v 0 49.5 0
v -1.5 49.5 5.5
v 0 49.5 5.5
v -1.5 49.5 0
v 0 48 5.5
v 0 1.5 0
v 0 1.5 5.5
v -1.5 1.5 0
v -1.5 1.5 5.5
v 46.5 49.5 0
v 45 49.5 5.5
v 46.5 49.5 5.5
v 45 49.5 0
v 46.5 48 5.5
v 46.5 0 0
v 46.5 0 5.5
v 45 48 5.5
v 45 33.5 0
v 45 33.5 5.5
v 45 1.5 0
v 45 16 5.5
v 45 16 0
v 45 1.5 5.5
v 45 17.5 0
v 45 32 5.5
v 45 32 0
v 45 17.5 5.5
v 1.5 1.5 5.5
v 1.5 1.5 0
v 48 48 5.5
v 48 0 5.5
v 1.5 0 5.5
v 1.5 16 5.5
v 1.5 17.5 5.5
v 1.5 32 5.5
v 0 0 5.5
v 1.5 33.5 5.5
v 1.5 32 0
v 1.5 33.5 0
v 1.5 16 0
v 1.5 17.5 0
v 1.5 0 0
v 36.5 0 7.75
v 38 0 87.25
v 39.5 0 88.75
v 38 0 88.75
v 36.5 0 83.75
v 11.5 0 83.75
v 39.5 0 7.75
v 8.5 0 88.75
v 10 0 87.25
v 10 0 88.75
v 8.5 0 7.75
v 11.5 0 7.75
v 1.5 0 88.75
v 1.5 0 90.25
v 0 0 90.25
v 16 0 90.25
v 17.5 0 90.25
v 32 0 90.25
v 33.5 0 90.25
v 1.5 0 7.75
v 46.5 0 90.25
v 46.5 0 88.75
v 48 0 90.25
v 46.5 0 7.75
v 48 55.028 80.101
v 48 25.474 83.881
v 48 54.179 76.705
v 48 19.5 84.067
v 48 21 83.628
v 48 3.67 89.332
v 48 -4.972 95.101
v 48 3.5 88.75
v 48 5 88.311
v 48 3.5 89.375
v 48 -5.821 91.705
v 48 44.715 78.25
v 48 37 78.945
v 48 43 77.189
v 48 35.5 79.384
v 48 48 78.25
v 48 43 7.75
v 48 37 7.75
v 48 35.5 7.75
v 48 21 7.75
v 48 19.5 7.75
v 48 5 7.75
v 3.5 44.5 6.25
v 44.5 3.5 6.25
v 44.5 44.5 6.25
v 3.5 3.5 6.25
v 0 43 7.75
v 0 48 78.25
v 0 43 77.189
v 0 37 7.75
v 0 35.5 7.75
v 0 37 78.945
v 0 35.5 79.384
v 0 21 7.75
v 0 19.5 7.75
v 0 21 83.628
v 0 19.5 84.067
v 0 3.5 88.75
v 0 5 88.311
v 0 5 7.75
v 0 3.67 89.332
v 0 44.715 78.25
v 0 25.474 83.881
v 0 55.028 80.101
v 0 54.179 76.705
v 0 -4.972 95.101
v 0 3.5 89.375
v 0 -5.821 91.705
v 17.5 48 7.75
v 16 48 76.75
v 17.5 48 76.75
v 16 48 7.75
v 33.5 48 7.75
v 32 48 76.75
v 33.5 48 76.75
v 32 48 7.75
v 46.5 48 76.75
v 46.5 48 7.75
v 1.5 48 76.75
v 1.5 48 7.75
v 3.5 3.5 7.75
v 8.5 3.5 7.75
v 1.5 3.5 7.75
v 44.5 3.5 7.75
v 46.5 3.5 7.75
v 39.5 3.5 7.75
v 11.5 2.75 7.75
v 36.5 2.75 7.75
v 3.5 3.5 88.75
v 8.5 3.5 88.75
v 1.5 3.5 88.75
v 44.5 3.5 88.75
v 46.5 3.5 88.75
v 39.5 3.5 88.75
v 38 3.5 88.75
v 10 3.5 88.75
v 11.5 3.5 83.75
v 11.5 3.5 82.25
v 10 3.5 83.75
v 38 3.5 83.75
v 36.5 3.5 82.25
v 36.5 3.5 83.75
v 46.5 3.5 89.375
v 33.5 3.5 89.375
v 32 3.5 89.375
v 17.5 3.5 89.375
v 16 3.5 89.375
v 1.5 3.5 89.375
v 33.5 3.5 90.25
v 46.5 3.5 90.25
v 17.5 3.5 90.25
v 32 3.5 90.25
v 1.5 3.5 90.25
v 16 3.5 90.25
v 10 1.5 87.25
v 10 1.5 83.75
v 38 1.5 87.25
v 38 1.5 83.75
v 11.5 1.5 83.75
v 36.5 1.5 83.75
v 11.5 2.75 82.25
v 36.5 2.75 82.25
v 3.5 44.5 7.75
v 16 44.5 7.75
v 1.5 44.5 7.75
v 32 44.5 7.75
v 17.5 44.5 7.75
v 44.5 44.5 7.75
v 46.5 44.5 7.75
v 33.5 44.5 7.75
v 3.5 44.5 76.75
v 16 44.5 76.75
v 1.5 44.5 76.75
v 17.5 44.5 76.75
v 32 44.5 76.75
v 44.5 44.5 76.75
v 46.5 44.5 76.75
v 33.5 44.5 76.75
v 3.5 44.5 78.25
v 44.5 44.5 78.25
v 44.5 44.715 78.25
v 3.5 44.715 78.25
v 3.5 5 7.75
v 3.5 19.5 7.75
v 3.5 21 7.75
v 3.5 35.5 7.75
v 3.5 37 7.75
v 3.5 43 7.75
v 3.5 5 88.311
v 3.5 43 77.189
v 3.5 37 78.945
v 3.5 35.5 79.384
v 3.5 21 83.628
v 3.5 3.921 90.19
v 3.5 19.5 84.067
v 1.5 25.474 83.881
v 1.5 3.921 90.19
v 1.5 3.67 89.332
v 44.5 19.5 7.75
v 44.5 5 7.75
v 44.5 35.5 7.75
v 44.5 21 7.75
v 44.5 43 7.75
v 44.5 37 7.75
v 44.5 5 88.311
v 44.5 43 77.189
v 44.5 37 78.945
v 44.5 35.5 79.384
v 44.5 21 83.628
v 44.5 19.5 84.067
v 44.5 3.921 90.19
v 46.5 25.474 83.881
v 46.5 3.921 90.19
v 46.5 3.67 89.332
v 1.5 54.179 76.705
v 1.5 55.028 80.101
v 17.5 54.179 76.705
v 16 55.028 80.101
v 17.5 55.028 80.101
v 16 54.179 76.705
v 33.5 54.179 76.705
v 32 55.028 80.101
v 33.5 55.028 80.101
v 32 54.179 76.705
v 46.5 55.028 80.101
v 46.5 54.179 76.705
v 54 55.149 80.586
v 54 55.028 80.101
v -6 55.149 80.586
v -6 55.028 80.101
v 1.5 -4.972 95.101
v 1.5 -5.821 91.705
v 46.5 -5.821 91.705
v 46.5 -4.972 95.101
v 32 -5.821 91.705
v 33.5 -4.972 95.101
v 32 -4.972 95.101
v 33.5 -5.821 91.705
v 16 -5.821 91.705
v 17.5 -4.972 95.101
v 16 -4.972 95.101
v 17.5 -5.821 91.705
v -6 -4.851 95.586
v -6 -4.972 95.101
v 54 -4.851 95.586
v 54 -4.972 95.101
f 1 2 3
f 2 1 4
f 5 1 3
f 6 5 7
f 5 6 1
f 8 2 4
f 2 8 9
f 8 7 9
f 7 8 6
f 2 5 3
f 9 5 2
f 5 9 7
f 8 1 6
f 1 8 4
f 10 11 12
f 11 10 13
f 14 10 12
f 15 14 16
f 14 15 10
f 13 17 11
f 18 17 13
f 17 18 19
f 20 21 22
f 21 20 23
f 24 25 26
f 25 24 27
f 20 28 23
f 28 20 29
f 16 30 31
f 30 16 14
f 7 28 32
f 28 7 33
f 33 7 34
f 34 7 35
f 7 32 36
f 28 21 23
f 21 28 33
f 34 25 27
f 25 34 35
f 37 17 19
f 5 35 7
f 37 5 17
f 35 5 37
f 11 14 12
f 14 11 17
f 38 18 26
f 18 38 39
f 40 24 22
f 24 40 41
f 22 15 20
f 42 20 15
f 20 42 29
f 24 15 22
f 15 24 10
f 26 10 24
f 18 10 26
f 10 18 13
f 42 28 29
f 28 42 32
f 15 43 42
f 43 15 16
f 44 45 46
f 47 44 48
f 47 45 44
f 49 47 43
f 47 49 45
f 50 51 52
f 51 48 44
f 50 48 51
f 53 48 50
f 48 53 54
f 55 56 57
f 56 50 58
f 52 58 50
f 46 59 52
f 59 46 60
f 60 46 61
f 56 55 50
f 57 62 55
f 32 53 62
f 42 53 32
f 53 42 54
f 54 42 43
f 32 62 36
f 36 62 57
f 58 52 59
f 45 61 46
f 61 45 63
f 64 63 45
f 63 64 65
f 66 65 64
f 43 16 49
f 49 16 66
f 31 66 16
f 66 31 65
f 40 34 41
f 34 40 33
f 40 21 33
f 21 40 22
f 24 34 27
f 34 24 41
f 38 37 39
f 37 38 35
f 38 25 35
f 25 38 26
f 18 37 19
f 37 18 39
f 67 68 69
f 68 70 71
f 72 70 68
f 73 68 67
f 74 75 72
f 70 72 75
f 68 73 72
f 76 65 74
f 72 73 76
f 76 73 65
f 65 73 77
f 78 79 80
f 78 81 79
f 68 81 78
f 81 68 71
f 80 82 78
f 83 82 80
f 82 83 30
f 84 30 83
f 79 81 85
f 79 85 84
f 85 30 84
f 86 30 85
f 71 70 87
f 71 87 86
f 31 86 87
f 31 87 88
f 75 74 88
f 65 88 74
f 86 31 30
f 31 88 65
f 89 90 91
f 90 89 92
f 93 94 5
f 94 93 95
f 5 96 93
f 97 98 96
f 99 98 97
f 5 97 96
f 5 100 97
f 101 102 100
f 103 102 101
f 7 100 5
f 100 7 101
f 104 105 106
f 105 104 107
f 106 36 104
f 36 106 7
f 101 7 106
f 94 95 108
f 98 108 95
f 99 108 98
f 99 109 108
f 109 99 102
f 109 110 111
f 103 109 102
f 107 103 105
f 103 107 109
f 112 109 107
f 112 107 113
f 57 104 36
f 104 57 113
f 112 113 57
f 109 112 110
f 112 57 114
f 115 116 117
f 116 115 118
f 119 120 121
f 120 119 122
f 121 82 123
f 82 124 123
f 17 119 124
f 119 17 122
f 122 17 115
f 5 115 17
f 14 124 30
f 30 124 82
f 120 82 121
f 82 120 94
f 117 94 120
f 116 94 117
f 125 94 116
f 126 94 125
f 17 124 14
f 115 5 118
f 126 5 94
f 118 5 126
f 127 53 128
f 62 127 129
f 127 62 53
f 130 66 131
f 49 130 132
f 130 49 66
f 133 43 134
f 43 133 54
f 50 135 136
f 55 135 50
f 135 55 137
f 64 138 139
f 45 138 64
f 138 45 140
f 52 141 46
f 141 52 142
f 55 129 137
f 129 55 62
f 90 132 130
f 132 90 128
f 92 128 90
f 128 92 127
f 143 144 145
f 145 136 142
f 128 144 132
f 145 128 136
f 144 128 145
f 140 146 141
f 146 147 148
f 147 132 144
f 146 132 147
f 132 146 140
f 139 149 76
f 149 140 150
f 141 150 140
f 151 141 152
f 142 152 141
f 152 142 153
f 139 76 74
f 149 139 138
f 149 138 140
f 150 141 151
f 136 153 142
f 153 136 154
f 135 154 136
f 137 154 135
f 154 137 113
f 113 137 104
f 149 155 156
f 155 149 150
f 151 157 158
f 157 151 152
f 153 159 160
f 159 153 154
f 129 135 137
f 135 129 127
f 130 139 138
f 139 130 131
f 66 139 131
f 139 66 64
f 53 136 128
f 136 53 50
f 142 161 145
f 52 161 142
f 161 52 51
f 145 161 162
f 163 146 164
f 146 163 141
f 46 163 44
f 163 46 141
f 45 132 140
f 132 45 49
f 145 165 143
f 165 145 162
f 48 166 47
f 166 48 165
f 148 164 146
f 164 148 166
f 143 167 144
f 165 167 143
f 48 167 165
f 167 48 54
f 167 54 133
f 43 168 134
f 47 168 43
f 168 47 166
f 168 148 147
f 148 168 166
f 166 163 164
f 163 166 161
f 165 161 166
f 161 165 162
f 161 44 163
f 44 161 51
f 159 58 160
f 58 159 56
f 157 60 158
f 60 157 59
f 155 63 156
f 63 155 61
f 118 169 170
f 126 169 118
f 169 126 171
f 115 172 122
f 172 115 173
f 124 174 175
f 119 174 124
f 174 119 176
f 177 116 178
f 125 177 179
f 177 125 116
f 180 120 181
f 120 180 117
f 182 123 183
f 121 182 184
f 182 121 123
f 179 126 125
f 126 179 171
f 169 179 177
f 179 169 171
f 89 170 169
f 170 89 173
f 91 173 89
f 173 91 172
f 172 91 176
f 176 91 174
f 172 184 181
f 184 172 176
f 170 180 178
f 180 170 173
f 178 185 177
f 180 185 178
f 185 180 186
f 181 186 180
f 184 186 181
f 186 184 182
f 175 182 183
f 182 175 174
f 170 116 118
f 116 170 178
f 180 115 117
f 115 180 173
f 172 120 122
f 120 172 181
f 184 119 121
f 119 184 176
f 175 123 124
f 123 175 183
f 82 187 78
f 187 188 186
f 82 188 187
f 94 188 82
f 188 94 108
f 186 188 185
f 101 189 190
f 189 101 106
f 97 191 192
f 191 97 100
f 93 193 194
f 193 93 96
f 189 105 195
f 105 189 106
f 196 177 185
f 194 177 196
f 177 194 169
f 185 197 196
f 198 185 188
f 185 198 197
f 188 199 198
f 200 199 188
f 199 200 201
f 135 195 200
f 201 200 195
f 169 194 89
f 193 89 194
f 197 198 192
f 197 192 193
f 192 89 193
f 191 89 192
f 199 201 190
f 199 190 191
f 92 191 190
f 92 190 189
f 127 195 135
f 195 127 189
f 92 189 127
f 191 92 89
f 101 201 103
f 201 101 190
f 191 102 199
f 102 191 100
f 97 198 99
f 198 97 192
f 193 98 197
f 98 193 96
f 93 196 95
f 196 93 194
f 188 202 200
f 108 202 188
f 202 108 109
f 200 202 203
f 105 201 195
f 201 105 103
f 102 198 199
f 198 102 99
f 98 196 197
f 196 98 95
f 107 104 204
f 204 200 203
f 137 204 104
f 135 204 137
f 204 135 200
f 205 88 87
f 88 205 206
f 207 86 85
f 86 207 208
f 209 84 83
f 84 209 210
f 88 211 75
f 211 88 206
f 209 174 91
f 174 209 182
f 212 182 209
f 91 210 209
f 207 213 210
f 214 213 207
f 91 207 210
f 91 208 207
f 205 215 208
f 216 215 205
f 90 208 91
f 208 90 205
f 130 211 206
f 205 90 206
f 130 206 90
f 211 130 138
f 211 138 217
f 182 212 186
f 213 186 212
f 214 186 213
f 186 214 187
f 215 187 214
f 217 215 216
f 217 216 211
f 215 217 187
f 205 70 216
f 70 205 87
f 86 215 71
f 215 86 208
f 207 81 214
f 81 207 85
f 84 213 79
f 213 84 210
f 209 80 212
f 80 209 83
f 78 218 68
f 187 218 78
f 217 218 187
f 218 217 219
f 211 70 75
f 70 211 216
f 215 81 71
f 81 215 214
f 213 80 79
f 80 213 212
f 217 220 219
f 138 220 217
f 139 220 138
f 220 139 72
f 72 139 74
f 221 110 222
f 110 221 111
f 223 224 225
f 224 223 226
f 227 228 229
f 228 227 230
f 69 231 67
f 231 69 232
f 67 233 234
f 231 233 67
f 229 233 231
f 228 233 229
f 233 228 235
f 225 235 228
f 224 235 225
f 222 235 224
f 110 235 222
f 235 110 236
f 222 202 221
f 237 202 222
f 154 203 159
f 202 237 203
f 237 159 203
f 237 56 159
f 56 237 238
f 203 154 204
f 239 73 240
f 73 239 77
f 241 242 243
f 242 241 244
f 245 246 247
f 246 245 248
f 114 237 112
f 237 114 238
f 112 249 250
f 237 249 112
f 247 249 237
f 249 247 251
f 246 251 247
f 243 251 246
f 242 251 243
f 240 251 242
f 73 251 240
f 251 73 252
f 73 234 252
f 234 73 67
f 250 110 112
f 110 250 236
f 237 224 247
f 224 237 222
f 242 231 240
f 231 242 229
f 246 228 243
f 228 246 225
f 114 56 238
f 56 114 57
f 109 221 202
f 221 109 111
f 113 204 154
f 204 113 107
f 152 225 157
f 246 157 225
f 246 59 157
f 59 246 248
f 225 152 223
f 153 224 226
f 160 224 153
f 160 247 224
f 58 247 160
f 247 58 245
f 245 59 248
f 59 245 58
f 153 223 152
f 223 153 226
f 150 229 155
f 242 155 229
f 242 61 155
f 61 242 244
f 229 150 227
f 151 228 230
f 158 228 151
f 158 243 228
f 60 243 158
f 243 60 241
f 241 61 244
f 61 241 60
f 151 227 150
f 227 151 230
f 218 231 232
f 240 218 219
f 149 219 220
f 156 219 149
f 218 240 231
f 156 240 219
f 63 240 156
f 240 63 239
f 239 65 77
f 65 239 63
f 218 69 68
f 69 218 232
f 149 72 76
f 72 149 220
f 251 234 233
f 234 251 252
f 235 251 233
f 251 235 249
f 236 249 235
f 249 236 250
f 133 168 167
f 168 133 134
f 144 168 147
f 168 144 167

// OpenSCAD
// outhouse.scad — parametric framed outhouse for a recreational property.
// Units: INCHES.  Built from real dimensional lumber via lib/lumber.scad, so the
// cut list (captured from echoes) always matches this geometry.
//
// Edit the parameters below and re-run `cad-build projects/outhouse --open` to
// regenerate the render + cut list + PDF.

use <../../lib/lumber.scad>

/* ───── parameters ───── */
WIDTH   = 48;   // X: side-to-side (outside of framing)
DEPTH   = 48;   // Y: front-to-back
H_FRONT = 84;   // wall height at front (door side) — measured from floor deck
H_BACK  = 72;   // wall height at back (roof slopes down toward the back)
STUD_OC = 16;   // stud spacing, on-center
OVERHANG = 6;   // roof overhang past the walls

DOOR_W  = 28;   // rough opening width
DOOR_H  = 76;   // rough opening height

// When true, hide the roof + door panel so the top view reads as a framing
// plan. cad-render sets this (via -D PLAN_VIEW=true) for the plan render only.
PLAN_VIEW = false;

JOIST   = "2x6";          // floor joists
FRAME   = "2x4";          // wall + roof framing
DECK_T  = 0.75;           // floor deck plywood
ROOF_T  = 0.5;            // roof sheathing plywood

WALL_DEPTH = lumber_dims(FRAME)[0];   // 3.5 — wall thickness
PLATE_T    = lumber_dims(FRAME)[1];   // 1.5 — plate thickness
JOIST_H    = lumber_dims(JOIST)[0];   // 5.5 — floor frame height
DECK_TOP   = JOIST_H + DECK_T;        // top of floor deck; walls start here

/* ───── plan metadata (flows into the PDF) ───── */
plan_meta(
    title    = "Outhouse — Recreational Property",
    subtitle = str(WIDTH, "\" x ", DEPTH, "\" footprint, mono-slope roof, ", DOOR_W, "\" door"),
    units    = "inches",
    material = "construction-grade SPF; pressure-treated floor frame; plywood deck/roof");
plan_dim("Footprint",        str(WIDTH, "\" x ", DEPTH, "\""));
plan_dim("Wall height",      str(H_FRONT, "\" front / ", H_BACK, "\" back"));
plan_dim("Roof slope",       str(round(atan((H_FRONT-H_BACK)/DEPTH)*10)/10, "° (", H_FRONT-H_BACK, "\" drop over ", DEPTH, "\")"));
plan_dim("Door rough op'ng", str(DOOR_W, "\" x ", DOOR_H, "\""));
plan_dim("Stud spacing",     str(STUD_OC, "\" o.c."));
plan_note("Build the floor frame from pressure-treated lumber; everything above can be SPF.");
plan_note("Set the floor frame level on blocks/skids; check it for square before decking.");
plan_note("Sheathe the roof, then add roofing felt + metal or asphalt; cut siding to taste.");
plan_note("Hang the door to swing OUT so it clears the (downhill) interior.");

// Ordered build sequence (rendered as a numbered Assembly Sequence in the PDF).
plan_step("Set level skids/blocks, then build the PT floor frame (rims + joists) and check it for square.");
plan_step("Deck the floor with 3/4\" plywood, fastened to every joist.");
plan_step("Frame the walls on the deck: front tall, back short, side walls cut on the slope; frame the door opening with king + jack studs and a header.");
plan_step("Stand the four walls, plumb and brace them, then nail the corners together.");
plan_step("Set the sloped rafters at 16\" o.c.; sheathe the roof, then felt + metal/asphalt.");
plan_step("Hang the door, add siding/finishes, prime and paint.");

/* ───── floor frame: 2x6 joists on edge + plywood deck ───── */
module floor() {
    // side rims run along Y
    for (x = [0, WIDTH - PLATE_T])
        translate([x, 0, 0]) rotate([0, 0, 90]) translate([0, 0, 0])
            // beam runs along +X; rotate 90° about Z -> runs along +Y
            translate([PLATE_T, 0, 0]) beam(JOIST, DEPTH, "floor side rim");
    // cross joists run along X, between the side rims, at OC
    for (y = [0 : STUD_OC : DEPTH - 1])
        translate([PLATE_T, min(y, DEPTH - PLATE_T), 0])
            beam(JOIST, WIDTH - 2*PLATE_T, "floor joist");
    // deck (hidden in plan view so the joist layout shows through)
    if (!PLAN_VIEW)
        translate([0, 0, JOIST_H]) sheet(DECK_T, WIDTH, DEPTH, "floor deck");
}

/* ───── a stud wall built along +X, sitting on the floor deck ─────
   L  = length, hf/hb = wall height at x=0 / x=L (equal => flat top).
   opening = [x0, w, h] for a door/window rough opening (or undef). */
module stud_wall(L, hf, hb, opening = undef, tag = "wall") {
    sloped = (hf != hb);
    ang = atan((hf - hb) / L);

    // bottom plate
    plate(FRAME, L, str(tag, " bottom plate"));

    // top plate (horizontal, or sloped along the wall)
    if (!sloped)
        translate([0, 0, hf - PLATE_T]) plate(FRAME, L, str(tag, " top plate"));
    else
        translate([0, 0, hf - PLATE_T]) rotate([0, ang, 0])
            plate(FRAME, L / cos(ang), str(tag, " top plate (sloped)"));

    function h_at(x) = hf + (hb - hf) * x / L;

    has_op = !is_undef(opening);
    ox = has_op ? opening[0] : -1;
    ow = has_op ? opening[1] : 0;
    oh = has_op ? opening[2] : 0;

    // common studs at OC, skipping the rough opening
    for (i = [0 : ceil(L / STUD_OC)]) {
        x = min(i * STUD_OC, L - PLATE_T);
        inop = has_op && (x + PLATE_T > ox) && (x < ox + ow);
        if (!inop)
            translate([x, 0, PLATE_T]) stud(FRAME, h_at(x) - 2*PLATE_T, str(tag, " stud"));
    }

    // opening framing: king studs (full height) + jack studs + header
    if (has_op) {
        for (kx = [ox - PLATE_T, ox + ow])         // king studs
            translate([kx, 0, PLATE_T]) stud(FRAME, h_at(kx) - 2*PLATE_T, str(tag, " king stud"));
        for (jx = [ox, ox + ow - PLATE_T])         // jack (trimmer) studs
            translate([jx, 0, PLATE_T]) stud(FRAME, oh, str(tag, " jack stud"));
        translate([ox - PLATE_T, 0, PLATE_T + oh]) // header across the opening
            beam(FRAME, ow + 2*PLATE_T, str(tag, " door header"));
    }
}

/* ───── roof: rafters on edge + plywood sheathing, tilted as one assembly ───── */
module roof() {
    ang = atan((H_FRONT - H_BACK) / DEPTH);
    run = DEPTH + 2*OVERHANG;
    rlen = run / cos(ang);                 // sloped rafter length
    // build flat in local frame (underside at z=0), pivot at front wall plane y=0
    translate([0, 0, DECK_TOP + H_FRONT]) rotate([-ang, 0, 0])
    translate([0, -OVERHANG, 0]) {
        for (i = [0 : ceil(WIDTH / STUD_OC)]) {
            x = min(i * STUD_OC, WIDTH - PLATE_T);
            translate([x + PLATE_T, 0, 0]) rotate([0, 0, 90]) beam(FRAME, rlen, "rafter");
        }
        translate([-OVERHANG, 0, lumber_dims(FRAME)[0]])
            sheet(ROOF_T, WIDTH + 2*OVERHANG, rlen, "roof sheathing");
    }
}

/* ───── door panel (plywood), shown in the opening ───── */
module door_panel() {
    dx = (WIDTH - DOOR_W) / 2;
    translate([dx, WALL_DEPTH, DECK_TOP]) rotate([90, 0, 0])
        sheet(DECK_T, DOOR_W, DOOR_H, "door panel");
}

/* ───── assembly ───── */
floor();

door_x = (WIDTH - DOOR_W) / 2;
// front wall (door side, tall)
translate([0, 0, DECK_TOP]) stud_wall(WIDTH, H_FRONT, H_FRONT, [door_x, DOOR_W, DOOR_H], "front wall");
// back wall (short)
translate([0, DEPTH - WALL_DEPTH, DECK_TOP]) stud_wall(WIDTH, H_BACK, H_BACK, undef, "back wall");
// side walls (sloped front->back), inset between front and back walls
translate([WALL_DEPTH, WALL_DEPTH, DECK_TOP]) rotate([0, 0, 90])
    stud_wall(DEPTH - 2*WALL_DEPTH, H_FRONT, H_BACK, undef, "left wall");
translate([WIDTH, WALL_DEPTH, DECK_TOP]) rotate([0, 0, 90])
    stud_wall(DEPTH - 2*WALL_DEPTH, H_FRONT, H_BACK, undef, "right wall");

if (!PLAN_VIEW) {
    roof();
    door_panel();
}
